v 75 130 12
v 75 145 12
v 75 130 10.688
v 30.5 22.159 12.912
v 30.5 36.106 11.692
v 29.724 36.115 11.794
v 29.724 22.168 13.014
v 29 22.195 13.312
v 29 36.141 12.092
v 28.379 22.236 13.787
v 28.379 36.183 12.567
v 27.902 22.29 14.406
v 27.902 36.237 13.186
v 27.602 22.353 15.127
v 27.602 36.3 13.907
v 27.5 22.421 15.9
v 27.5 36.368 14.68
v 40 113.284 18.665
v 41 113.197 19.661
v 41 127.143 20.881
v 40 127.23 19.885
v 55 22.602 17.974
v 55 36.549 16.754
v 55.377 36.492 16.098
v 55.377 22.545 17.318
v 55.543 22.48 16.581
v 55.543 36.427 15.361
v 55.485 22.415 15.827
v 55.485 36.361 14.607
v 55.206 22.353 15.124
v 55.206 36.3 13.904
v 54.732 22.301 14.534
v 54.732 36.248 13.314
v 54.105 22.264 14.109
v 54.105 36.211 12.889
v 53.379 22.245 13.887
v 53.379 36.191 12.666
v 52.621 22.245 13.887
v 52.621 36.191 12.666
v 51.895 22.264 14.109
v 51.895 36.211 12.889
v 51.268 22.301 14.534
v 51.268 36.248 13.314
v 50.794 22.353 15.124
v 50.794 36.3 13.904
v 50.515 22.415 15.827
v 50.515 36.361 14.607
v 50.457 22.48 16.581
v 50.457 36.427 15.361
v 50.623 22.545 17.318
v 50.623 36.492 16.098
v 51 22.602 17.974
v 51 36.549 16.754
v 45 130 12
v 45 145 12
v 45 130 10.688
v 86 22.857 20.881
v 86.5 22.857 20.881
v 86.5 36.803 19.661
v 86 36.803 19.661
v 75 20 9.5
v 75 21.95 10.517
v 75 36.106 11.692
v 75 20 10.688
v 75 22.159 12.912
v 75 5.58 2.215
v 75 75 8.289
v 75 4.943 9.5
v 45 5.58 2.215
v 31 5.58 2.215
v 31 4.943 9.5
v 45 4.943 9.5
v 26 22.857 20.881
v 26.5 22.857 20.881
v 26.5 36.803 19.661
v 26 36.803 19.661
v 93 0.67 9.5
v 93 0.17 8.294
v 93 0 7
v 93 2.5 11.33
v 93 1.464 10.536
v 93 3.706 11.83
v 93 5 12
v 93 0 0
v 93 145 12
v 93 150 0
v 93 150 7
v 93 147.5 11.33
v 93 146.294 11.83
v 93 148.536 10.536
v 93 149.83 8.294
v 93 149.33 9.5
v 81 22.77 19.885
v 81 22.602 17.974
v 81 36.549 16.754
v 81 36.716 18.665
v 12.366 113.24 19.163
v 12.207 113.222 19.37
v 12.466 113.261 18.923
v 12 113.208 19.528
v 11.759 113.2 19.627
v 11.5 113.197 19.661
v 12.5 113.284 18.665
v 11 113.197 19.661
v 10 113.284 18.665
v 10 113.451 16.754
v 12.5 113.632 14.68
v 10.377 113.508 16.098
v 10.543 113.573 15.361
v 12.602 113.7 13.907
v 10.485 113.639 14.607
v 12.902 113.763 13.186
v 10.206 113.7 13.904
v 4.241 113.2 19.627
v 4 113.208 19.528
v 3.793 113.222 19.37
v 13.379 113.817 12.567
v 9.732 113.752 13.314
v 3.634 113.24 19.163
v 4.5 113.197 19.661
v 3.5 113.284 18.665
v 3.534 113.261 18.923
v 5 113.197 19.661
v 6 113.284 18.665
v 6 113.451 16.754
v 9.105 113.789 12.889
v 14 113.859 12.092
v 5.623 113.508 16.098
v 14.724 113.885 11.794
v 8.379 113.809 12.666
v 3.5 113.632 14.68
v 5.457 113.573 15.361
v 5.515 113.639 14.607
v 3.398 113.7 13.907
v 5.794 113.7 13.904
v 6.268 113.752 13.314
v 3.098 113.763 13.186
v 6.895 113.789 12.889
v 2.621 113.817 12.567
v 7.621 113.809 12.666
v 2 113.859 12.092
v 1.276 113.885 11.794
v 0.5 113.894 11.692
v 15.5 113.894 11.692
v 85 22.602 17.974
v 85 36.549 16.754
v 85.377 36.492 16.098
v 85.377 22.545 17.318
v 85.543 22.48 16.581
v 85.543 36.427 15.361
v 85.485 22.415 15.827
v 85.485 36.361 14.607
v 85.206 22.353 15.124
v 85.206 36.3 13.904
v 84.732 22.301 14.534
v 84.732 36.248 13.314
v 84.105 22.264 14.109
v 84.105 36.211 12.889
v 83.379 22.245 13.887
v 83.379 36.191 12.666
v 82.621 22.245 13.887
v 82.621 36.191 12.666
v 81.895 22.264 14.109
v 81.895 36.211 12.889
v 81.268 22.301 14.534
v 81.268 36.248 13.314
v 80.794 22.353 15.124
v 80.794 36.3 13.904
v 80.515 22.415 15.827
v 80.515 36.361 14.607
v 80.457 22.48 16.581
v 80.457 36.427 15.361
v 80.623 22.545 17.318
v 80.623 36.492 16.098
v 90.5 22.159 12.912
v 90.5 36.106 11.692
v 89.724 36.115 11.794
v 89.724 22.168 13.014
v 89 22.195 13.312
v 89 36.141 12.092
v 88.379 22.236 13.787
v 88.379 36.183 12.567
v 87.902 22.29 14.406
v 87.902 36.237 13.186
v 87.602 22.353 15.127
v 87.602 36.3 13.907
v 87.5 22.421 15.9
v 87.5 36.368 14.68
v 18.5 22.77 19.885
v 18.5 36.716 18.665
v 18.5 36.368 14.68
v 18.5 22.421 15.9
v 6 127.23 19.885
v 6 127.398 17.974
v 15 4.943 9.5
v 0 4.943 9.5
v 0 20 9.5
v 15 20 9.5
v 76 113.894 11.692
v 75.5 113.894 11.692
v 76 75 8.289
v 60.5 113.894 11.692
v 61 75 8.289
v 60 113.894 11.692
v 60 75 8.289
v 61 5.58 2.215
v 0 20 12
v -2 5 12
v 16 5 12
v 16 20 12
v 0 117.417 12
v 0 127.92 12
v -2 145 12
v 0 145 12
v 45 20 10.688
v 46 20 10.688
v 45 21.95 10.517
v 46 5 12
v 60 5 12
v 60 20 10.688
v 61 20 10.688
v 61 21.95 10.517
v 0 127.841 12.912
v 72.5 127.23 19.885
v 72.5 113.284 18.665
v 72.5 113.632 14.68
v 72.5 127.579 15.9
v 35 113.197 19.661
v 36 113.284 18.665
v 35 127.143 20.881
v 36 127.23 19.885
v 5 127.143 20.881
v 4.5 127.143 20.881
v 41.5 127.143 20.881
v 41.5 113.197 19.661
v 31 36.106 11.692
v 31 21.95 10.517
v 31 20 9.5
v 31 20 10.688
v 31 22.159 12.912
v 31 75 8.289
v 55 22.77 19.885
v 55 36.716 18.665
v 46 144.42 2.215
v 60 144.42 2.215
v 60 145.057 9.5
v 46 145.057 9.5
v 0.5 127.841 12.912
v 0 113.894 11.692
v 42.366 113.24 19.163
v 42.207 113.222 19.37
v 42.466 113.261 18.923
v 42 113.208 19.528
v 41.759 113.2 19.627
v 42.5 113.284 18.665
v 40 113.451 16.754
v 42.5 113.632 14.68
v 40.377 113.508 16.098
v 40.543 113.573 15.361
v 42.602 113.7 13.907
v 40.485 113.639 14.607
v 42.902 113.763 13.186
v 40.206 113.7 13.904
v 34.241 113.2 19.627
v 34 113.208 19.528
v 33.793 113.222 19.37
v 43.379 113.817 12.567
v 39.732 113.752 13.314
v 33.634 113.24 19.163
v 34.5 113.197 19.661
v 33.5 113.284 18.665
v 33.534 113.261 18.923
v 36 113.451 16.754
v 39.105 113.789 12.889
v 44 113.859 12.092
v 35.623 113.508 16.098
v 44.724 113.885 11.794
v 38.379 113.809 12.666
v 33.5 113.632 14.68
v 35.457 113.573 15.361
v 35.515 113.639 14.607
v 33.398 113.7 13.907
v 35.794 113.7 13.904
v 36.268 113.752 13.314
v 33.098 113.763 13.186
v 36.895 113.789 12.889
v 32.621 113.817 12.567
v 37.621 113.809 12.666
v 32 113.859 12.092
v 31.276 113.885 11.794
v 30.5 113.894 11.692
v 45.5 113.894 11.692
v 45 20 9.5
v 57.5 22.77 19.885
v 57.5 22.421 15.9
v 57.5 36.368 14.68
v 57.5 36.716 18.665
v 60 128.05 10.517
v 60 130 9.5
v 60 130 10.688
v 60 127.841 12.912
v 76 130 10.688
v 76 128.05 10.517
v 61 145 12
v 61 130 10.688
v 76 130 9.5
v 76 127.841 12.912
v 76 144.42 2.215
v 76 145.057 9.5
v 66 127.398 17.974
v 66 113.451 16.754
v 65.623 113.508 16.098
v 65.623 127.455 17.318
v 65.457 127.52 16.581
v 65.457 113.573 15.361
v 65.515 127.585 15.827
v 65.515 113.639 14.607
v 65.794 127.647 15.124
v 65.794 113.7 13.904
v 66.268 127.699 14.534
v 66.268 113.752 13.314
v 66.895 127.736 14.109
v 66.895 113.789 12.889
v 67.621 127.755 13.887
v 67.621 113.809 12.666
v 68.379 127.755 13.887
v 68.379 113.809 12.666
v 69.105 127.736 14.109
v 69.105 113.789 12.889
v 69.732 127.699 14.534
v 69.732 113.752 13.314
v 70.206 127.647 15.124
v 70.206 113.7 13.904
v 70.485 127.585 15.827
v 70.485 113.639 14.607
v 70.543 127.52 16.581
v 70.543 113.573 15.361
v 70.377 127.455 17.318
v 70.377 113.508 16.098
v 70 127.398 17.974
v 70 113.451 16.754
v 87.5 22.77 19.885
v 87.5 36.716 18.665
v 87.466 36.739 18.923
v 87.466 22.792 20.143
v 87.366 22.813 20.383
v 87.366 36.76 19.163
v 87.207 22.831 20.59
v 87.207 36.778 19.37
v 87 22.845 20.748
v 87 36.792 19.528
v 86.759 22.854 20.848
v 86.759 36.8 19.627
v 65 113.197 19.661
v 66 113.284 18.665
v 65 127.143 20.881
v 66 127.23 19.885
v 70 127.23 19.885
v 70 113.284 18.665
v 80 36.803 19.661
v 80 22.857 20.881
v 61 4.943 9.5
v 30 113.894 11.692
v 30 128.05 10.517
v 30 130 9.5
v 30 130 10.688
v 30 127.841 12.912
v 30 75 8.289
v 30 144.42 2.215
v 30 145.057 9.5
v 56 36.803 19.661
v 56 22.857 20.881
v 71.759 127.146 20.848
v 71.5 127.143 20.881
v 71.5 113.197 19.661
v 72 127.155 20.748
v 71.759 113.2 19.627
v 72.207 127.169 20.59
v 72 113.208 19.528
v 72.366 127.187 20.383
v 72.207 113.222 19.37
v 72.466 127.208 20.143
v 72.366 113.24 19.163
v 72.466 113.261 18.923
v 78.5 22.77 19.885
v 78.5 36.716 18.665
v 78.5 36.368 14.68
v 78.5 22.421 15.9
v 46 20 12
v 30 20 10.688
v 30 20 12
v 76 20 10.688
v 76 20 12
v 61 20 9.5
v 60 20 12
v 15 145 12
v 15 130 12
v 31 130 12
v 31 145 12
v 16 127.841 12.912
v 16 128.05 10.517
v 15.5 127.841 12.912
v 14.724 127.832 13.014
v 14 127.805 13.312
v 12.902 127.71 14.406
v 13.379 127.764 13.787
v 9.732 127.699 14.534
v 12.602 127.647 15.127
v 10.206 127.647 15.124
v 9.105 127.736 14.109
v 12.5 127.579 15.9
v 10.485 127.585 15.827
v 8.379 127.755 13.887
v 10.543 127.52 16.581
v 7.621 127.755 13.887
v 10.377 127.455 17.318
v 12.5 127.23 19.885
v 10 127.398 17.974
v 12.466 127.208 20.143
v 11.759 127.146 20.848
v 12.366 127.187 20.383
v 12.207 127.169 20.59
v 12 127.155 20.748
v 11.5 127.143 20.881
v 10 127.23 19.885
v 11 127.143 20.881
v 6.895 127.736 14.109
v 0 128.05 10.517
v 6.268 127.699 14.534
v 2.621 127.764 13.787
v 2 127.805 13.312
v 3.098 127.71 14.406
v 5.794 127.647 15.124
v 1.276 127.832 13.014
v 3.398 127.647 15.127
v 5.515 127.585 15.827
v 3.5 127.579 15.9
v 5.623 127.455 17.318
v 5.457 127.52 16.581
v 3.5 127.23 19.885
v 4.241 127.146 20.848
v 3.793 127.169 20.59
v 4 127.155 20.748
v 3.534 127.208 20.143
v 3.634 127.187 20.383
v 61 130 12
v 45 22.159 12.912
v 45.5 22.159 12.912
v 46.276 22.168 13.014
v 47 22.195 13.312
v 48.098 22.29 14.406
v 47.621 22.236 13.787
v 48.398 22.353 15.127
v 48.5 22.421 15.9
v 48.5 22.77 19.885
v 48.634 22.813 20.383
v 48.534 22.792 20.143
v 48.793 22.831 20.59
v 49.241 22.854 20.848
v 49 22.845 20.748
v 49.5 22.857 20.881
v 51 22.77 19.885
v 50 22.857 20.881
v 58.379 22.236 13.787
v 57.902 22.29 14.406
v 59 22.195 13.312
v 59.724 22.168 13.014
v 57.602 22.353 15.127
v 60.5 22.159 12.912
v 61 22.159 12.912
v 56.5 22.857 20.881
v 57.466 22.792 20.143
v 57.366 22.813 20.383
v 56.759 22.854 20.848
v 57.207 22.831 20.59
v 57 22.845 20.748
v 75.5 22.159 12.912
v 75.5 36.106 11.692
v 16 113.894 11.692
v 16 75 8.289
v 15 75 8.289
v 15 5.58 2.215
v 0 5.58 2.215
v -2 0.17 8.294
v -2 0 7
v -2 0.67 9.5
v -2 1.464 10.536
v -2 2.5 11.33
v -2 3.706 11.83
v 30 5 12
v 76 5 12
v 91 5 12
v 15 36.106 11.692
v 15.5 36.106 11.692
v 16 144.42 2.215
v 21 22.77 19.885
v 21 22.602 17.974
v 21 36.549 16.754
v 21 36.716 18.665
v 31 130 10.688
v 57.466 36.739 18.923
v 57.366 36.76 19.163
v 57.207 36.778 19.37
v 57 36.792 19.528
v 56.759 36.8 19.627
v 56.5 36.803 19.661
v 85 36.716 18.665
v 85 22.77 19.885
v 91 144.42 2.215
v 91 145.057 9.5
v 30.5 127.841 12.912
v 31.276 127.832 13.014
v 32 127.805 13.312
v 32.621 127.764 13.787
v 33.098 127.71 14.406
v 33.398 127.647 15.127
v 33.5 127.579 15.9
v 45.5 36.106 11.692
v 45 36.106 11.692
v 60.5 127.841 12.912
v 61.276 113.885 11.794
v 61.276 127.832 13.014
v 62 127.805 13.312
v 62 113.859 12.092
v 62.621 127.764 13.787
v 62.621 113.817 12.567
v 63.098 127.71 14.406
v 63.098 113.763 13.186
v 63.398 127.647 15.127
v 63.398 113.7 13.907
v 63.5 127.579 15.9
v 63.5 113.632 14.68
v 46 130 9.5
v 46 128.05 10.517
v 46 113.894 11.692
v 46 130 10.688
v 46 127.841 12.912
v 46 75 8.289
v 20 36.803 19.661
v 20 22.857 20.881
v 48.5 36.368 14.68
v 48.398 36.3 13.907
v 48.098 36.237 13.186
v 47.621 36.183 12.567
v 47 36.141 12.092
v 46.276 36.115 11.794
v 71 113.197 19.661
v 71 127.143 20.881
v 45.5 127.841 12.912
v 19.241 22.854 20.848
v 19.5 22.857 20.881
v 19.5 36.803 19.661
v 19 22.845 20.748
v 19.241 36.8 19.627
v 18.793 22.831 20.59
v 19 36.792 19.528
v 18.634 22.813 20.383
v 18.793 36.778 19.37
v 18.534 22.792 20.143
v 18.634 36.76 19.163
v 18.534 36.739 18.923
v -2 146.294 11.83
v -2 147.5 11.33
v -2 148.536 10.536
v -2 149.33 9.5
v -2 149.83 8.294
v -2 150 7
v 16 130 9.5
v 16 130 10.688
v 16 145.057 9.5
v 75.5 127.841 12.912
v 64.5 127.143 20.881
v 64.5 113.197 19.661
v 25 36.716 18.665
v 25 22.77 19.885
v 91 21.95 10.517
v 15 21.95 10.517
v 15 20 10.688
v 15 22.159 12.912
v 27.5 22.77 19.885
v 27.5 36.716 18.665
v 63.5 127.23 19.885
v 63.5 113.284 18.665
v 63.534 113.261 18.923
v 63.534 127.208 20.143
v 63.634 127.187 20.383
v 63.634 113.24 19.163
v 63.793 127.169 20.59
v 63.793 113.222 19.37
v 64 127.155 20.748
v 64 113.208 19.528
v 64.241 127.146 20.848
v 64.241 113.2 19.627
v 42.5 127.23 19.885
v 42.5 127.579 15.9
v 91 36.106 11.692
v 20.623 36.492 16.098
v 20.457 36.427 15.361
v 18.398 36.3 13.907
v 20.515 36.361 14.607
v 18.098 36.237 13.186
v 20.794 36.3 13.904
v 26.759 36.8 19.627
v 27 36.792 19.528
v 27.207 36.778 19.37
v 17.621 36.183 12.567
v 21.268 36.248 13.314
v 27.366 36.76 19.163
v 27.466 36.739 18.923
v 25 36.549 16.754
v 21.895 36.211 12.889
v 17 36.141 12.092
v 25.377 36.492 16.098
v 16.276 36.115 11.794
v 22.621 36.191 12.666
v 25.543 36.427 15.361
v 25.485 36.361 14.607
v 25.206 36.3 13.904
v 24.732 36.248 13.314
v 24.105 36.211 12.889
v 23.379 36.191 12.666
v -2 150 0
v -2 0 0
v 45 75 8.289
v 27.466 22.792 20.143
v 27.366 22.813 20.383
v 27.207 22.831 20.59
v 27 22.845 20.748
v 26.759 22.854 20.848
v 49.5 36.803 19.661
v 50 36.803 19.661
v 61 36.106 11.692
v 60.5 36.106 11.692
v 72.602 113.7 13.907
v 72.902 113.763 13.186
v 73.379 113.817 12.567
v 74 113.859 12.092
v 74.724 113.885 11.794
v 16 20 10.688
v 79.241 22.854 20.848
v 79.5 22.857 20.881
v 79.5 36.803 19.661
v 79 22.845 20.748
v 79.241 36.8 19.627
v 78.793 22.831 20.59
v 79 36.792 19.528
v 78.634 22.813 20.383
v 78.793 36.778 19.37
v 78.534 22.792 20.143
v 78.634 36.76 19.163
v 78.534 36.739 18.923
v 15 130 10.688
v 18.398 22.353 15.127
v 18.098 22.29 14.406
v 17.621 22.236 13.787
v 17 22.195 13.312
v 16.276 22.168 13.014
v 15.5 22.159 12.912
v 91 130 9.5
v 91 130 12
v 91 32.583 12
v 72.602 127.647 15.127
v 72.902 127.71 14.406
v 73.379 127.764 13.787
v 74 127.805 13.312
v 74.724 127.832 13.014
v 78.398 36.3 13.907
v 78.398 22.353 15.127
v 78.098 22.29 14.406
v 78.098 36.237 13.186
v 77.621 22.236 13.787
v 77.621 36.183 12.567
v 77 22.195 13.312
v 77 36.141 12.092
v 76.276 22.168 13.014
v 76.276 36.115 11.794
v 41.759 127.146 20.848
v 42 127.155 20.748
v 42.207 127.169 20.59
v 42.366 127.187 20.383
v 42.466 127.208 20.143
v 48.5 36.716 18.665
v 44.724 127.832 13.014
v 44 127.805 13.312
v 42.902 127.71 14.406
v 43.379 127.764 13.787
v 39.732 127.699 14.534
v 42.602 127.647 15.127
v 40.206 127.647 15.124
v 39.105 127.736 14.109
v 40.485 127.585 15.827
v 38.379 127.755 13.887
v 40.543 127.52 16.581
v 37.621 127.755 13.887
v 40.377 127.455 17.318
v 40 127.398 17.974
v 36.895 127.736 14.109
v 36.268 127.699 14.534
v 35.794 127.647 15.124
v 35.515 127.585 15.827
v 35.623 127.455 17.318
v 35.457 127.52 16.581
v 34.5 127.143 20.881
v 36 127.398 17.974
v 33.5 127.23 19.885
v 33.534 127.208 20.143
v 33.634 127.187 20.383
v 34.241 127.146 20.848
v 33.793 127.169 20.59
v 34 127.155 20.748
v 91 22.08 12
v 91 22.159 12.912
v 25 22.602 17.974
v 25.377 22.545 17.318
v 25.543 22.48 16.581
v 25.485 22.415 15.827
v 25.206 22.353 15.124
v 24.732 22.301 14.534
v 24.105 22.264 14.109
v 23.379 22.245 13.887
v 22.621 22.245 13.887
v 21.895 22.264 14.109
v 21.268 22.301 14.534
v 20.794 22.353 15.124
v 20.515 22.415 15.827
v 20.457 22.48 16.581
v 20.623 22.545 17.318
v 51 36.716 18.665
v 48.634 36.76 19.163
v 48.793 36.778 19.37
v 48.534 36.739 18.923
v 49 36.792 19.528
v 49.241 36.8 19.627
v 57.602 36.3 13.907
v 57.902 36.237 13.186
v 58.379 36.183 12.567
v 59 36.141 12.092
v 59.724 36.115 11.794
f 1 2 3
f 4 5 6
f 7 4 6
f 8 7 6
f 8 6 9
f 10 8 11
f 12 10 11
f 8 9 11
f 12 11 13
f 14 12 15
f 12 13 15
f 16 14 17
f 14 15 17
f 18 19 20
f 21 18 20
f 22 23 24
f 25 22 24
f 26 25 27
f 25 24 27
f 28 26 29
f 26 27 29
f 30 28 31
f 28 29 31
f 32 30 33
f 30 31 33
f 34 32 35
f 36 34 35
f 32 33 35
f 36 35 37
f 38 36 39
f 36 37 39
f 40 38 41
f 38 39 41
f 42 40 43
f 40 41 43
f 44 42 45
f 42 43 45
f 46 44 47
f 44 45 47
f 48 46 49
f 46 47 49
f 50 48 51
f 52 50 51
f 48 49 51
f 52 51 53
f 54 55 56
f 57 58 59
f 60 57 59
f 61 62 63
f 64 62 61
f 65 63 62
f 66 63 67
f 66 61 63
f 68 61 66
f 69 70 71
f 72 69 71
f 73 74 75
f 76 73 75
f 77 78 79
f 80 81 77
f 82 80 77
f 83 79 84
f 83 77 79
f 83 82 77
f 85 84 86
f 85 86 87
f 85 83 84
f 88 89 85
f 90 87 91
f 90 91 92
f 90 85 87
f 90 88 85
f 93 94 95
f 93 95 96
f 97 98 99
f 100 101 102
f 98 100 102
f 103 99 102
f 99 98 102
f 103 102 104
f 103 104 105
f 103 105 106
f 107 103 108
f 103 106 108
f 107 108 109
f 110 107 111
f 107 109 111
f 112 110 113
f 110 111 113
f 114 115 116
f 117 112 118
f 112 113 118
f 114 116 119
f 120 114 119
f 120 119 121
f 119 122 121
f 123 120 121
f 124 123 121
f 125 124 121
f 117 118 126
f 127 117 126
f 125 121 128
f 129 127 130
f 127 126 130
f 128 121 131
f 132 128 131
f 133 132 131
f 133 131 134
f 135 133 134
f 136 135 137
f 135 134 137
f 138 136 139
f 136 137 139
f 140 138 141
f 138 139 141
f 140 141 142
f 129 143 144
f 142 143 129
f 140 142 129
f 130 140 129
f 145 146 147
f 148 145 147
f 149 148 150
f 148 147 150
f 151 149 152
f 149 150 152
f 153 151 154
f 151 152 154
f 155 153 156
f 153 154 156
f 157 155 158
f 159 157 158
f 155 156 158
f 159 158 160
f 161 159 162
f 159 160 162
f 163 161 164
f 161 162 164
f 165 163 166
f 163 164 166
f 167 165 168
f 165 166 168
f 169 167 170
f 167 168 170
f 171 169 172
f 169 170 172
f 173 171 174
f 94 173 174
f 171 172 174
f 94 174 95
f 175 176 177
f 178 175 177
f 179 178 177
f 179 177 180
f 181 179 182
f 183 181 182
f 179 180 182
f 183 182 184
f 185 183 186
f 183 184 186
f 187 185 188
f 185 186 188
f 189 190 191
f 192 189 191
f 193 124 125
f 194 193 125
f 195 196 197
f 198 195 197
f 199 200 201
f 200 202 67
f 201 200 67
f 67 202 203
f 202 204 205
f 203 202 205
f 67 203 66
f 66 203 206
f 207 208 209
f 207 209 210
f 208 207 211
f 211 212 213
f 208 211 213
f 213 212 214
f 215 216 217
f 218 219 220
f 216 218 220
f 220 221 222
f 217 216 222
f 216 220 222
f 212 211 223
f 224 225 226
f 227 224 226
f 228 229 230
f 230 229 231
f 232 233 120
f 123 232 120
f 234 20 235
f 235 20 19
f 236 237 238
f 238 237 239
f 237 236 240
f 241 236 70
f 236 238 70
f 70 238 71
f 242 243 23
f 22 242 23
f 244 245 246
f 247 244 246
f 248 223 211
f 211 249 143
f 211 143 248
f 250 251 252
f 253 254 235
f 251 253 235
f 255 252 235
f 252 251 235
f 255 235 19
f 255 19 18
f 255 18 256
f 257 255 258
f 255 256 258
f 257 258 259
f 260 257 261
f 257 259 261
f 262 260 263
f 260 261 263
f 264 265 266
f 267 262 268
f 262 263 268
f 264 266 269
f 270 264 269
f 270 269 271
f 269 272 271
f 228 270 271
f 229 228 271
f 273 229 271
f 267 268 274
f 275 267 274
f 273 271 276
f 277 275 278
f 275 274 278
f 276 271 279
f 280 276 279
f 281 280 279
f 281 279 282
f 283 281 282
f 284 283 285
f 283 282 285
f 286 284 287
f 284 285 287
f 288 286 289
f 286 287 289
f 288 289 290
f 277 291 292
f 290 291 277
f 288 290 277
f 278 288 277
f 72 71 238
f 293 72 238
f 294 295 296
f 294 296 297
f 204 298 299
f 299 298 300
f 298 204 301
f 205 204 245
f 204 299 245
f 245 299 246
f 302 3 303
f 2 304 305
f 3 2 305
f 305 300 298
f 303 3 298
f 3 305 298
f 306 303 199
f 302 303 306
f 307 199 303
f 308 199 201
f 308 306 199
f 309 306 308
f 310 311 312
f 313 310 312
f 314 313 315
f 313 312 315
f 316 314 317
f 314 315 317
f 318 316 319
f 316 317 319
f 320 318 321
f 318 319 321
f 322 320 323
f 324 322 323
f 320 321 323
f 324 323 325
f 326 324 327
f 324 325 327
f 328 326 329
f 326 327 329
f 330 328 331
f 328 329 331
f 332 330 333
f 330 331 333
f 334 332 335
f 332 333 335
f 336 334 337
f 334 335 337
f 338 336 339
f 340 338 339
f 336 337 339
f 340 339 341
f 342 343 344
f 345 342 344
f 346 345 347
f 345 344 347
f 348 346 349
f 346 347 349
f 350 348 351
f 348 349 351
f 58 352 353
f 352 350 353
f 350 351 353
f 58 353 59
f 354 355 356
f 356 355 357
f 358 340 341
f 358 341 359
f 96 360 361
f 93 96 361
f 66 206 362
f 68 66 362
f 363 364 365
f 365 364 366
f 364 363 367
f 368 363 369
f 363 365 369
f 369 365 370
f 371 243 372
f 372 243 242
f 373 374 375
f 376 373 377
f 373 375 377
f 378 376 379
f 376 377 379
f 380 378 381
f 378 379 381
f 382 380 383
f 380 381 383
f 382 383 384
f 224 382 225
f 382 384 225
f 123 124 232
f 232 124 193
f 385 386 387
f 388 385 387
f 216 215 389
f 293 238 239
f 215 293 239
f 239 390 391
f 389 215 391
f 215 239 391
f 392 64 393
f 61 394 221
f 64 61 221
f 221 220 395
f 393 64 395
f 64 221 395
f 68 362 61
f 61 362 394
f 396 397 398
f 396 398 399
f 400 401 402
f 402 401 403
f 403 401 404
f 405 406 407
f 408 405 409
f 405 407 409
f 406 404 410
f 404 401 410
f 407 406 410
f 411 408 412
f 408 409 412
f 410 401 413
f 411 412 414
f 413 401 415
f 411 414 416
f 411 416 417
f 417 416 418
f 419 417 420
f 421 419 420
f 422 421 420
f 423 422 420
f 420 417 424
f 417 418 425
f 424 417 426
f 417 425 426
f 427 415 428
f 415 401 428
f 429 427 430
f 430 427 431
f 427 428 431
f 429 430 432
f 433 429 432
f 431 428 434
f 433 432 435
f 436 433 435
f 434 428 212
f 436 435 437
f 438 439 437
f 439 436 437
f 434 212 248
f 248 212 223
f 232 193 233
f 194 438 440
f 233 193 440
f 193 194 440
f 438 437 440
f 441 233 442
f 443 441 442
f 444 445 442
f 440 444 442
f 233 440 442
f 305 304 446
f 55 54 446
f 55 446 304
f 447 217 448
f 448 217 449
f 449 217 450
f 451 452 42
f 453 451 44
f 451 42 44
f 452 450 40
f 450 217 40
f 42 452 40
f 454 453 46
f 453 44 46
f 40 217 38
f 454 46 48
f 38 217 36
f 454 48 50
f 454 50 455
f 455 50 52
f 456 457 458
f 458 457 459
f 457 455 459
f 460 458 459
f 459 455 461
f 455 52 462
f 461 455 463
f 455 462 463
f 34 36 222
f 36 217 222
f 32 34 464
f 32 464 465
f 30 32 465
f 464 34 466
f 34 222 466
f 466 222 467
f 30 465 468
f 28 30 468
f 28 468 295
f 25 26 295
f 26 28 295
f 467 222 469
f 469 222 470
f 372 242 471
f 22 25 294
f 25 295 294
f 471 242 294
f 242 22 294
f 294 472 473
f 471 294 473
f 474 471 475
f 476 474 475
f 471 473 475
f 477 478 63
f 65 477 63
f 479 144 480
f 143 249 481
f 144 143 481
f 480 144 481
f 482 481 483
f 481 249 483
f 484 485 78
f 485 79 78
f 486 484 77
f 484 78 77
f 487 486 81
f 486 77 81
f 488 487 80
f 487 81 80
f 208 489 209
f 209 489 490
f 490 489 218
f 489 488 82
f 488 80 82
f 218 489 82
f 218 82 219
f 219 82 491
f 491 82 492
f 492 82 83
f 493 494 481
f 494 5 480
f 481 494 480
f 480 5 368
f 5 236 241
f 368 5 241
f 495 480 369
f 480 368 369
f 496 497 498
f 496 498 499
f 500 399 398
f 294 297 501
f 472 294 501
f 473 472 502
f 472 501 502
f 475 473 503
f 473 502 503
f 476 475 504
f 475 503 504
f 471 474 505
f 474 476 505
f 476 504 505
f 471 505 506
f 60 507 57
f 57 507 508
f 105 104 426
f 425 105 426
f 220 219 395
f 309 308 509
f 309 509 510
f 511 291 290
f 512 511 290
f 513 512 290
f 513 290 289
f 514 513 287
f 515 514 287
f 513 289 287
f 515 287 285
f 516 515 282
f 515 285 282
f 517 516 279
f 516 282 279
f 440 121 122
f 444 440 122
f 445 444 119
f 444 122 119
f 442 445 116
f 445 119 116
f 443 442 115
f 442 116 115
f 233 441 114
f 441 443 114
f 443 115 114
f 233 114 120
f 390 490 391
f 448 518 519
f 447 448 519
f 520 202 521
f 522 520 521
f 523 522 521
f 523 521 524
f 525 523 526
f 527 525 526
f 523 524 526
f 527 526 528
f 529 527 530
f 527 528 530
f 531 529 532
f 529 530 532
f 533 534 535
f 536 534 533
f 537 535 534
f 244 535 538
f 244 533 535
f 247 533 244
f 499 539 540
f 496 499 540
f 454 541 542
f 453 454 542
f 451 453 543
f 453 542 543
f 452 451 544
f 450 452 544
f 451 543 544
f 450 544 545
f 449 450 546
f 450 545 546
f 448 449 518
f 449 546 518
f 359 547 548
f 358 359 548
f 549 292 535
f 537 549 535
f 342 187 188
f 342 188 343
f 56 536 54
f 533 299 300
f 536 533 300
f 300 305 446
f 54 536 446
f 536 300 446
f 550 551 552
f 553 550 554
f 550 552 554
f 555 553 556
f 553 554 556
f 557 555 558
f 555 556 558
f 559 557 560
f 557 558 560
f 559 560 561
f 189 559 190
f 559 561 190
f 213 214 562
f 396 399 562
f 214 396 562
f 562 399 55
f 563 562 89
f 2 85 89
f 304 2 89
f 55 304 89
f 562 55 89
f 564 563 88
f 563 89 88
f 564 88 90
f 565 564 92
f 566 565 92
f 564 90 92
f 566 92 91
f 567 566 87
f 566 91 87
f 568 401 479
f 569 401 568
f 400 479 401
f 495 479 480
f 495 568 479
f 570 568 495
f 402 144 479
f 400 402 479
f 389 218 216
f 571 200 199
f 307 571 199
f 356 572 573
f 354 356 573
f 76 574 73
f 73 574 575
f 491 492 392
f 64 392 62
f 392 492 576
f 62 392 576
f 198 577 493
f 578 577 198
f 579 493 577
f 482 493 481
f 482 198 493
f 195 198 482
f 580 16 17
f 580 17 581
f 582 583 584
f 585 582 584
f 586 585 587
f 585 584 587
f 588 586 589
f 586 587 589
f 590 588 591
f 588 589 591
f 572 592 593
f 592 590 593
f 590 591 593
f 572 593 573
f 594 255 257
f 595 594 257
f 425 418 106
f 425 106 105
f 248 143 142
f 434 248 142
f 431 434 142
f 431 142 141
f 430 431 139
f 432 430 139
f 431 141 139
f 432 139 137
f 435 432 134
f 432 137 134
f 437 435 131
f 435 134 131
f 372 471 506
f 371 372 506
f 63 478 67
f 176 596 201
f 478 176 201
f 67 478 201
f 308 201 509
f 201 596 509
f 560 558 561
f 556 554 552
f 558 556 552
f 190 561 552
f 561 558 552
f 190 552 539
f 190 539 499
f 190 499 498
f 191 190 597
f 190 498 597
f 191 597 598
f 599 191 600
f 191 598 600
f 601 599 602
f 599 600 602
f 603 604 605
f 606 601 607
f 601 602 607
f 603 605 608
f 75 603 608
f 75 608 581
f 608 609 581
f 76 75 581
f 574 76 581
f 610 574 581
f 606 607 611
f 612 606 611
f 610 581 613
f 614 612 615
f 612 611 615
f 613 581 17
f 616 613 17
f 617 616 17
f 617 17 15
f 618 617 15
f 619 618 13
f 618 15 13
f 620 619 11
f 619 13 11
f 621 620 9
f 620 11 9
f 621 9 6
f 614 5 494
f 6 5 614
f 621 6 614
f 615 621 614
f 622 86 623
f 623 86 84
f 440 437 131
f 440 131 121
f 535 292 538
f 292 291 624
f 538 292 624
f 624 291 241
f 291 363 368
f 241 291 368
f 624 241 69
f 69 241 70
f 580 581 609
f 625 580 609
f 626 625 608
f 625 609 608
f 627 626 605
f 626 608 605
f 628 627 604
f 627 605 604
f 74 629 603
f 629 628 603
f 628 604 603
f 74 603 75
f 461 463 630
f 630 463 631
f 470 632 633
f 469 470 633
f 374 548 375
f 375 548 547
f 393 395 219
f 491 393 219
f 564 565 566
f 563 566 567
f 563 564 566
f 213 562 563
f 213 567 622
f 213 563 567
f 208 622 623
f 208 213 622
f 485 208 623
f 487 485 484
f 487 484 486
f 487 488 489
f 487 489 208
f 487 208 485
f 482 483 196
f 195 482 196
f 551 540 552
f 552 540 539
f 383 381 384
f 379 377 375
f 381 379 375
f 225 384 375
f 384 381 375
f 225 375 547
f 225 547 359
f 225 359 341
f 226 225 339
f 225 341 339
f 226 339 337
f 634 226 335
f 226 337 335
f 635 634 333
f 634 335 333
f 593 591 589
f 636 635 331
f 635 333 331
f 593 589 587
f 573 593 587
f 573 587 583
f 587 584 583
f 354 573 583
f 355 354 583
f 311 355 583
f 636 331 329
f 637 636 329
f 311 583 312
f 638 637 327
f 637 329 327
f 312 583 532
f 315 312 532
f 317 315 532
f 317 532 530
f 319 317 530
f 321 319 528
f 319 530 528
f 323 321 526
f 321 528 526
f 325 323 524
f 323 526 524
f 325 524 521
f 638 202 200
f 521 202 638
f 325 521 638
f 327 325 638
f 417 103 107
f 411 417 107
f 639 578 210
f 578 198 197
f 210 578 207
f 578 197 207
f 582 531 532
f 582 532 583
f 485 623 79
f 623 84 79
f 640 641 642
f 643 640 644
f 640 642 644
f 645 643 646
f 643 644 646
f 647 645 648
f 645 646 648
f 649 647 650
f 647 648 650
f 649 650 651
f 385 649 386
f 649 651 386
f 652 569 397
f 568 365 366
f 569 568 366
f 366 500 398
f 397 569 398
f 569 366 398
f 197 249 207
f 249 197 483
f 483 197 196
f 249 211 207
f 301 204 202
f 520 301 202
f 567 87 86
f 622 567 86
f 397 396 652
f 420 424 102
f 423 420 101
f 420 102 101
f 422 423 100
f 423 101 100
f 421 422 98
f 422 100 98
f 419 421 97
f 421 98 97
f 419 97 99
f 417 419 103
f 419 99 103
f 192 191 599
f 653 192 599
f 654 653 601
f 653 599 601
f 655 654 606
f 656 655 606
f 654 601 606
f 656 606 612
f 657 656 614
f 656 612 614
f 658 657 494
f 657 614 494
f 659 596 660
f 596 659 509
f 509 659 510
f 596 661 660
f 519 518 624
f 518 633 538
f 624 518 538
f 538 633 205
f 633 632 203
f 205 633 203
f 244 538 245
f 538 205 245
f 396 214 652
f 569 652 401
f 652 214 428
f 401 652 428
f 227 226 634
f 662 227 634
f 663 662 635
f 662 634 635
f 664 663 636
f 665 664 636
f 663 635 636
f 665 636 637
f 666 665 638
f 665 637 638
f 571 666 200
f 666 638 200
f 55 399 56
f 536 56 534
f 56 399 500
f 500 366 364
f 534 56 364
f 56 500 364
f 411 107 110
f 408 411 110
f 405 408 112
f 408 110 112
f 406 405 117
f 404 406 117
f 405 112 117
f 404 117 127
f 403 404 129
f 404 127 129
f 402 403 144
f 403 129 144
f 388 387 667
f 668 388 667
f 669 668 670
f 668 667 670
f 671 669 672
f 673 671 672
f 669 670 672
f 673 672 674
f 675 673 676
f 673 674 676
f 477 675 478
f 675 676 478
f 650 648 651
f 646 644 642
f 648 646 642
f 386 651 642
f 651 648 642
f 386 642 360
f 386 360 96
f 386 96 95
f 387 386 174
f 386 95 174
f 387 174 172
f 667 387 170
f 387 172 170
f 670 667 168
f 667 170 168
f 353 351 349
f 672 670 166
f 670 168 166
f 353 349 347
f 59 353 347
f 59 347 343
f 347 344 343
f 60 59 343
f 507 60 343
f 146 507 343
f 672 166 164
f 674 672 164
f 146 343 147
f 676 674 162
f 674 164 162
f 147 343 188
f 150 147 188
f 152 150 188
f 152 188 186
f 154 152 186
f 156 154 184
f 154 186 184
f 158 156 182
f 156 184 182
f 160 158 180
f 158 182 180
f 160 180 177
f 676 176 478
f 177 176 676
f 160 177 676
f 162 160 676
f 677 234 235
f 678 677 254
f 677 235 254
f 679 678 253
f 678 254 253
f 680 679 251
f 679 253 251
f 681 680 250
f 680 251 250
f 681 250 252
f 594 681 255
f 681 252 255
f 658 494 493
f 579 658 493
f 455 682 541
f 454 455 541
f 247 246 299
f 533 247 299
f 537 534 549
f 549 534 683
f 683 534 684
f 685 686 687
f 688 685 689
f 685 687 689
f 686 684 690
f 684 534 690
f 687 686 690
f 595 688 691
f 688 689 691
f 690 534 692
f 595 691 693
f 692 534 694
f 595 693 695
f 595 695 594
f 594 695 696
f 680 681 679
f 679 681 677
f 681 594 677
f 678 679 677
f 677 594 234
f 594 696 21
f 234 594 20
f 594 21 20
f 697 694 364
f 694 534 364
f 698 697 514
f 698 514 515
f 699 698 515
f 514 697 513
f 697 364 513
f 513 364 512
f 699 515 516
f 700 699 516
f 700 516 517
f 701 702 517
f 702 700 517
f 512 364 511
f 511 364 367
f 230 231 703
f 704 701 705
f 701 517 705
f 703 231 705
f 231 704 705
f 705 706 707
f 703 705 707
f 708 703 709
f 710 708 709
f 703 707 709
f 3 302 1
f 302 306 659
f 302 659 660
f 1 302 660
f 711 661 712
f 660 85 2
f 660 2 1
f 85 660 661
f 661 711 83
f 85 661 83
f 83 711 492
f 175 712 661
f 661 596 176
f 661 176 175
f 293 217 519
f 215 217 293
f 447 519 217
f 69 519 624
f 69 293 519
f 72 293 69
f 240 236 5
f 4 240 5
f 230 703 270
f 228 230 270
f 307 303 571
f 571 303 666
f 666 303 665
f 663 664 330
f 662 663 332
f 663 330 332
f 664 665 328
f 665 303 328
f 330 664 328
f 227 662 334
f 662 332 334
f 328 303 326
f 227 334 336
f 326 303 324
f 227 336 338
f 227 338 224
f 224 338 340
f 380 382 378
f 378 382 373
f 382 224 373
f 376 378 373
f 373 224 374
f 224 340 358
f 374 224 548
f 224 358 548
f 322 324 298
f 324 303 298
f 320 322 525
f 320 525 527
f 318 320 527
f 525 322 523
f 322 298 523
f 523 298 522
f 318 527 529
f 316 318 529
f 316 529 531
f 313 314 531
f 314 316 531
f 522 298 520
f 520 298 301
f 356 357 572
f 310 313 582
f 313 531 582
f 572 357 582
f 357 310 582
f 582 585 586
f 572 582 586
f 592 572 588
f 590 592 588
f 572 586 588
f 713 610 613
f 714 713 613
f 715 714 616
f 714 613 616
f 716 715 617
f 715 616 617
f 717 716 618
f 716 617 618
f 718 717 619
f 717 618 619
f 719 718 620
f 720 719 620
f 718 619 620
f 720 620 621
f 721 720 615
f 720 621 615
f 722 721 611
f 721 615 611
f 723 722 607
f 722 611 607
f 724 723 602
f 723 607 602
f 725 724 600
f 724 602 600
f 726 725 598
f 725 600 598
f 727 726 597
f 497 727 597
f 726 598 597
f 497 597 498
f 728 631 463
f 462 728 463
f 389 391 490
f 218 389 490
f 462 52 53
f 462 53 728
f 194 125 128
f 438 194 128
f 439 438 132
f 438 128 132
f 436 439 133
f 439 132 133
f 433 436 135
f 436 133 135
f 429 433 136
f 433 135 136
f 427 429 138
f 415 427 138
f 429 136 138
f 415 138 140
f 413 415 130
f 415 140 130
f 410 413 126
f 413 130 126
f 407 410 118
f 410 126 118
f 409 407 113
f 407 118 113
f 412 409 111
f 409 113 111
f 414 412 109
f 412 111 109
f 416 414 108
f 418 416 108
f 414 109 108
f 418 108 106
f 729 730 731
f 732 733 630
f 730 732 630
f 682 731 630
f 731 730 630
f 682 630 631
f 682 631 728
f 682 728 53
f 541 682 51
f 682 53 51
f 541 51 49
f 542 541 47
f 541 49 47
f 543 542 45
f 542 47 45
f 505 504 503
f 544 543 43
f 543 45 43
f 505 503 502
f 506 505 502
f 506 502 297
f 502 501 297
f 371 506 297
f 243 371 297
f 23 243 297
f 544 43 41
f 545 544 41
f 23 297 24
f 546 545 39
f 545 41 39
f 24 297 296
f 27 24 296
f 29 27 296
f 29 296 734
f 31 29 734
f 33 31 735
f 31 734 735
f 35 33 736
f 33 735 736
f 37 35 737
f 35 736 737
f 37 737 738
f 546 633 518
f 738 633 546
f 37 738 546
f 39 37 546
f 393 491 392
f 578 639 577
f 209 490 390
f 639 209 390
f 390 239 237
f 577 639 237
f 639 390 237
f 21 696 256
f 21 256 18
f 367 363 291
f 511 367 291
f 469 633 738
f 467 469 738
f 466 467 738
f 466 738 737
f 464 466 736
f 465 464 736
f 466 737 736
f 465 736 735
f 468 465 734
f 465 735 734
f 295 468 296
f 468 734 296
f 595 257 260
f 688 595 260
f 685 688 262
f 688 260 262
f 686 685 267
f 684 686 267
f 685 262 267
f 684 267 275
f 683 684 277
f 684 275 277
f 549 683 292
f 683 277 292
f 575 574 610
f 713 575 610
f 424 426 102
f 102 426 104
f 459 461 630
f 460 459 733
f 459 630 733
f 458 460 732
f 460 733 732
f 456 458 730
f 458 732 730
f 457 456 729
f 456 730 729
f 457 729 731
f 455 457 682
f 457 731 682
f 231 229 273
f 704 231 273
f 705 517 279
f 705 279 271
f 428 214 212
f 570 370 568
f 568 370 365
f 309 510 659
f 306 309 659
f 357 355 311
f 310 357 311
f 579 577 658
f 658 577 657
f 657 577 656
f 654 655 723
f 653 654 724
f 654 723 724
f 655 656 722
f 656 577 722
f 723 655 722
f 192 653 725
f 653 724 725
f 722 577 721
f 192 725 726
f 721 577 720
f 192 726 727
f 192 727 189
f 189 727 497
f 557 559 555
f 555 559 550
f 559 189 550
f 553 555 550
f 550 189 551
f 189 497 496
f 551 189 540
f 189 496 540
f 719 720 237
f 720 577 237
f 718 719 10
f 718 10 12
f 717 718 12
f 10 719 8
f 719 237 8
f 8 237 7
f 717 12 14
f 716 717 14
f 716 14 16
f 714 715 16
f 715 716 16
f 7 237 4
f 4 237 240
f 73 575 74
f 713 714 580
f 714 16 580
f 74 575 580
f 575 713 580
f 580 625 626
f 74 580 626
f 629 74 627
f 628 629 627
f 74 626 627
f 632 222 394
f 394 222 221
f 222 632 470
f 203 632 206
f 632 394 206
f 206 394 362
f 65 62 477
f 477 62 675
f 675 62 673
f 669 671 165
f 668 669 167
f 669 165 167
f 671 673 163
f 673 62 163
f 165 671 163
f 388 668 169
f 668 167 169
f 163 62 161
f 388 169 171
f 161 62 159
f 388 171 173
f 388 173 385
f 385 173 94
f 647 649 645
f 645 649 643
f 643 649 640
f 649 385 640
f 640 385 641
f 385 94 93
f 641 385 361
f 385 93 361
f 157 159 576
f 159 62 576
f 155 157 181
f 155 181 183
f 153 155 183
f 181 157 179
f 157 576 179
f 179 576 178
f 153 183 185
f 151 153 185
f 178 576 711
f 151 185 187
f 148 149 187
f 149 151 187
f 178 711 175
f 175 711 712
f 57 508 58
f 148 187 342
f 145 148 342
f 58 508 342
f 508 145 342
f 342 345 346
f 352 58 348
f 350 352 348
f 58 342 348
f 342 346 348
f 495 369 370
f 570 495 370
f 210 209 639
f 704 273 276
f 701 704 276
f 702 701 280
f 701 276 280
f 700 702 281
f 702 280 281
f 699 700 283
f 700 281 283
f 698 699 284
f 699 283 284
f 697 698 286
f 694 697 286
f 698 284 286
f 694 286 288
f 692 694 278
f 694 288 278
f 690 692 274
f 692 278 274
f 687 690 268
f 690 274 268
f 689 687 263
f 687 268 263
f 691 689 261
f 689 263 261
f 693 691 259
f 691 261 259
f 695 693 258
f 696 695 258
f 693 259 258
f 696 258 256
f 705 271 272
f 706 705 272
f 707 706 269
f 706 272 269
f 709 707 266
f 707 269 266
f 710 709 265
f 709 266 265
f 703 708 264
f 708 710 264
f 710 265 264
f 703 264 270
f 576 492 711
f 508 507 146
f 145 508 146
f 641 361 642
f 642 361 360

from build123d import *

# Parameters (mm, degrees)
F1_DEPTH  = 16
F3_DEPTH  = 25
F4_SIZE   = 1
F11_ANGLE = 180
F14_DEPTH = 2
F16_DEPTH = 2


with BuildPart() as f1:
    # F0 (on Right) → F1 (new body)
    with BuildSketch(Plane.YZ):
        with BuildLine():
            Line((0, 7), (0, 0))
            Line((0, 0), (150, 0))
            Line((150, 0), (150, 7))
            ThreePointArc((150, 7), (148.5355339059, 10.5355339059), (145, 12))
            Line((145, 12), (128.050036002, 10.517070303))
            Line((128.050036002, 10.517070303), (127.1432693018, 20.8814611121))
            Line((127.1432693018, 20.8814611121), (113.1965435286, 19.6612807136))
            Line((113.1965435286, 19.6612807136), (113.8937894705, 11.6917231289))
            Line((113.8937894705, 11.6917231289), (5.5800139851, 2.2154956702))
            Line((5.5800139851, 2.2154956702), (4.9427024368, 9.5))
            Line((4.9427024368, 9.5), (20, 9.5))
            Line((20, 9.5), (20, 12))
            Line((20, 12), (5, 12))
            ThreePointArc((5, 12), (1.4644660941, 10.5355339059), (0, 7))
        make_face()
    extrude(amount=F1_DEPTH)

    # F2 (on face) → F3 (cut)
    with BuildSketch(Plane(origin=(0, 114.0437613881, 9.9775362673), x_dir=(1, 0, 0), z_dir=(0, -0.9961946981, -0.0871557427))):
        with BuildLine():
            Line((6, 9.7207347769), (6, 6.8026639789))
            ThreePointArc((6, 6.8026639789), (8, 2.6707347769), (10, 6.8026639789))
            Line((10, 6.8026639789), (10, 9.7207347769))
            Line((10, 9.7207347769), (11.5, 9.7207347769))
            ThreePointArc((11.5, 9.7207347769), (12.2071067812, 9.4278415581), (12.5, 8.7207347769))
            Line((12.5, 8.7207347769), (12.5, 4.7207347769))
            ThreePointArc((12.5, 4.7207347769), (13.3786796564, 2.5994144334), (15.5, 1.7207347769))
            Line((15.5, 1.7207347769), (18.5, 1.7207347769))
            Line((18.5, 1.7207347769), (18.5, 10.7207347769))
            Line((18.5, 10.7207347769), (-2.5, 10.7207347769))
            Line((-2.5, 10.7207347769), (-2.5, 1.7207347769))
            Line((-2.5, 1.7207347769), (0.5, 1.7207347769))
            ThreePointArc((0.5, 1.7207347769), (2.6213203436, 2.5994144334), (3.5, 4.7207347769))
            Line((3.5, 4.7207347769), (3.5, 8.7207347769))
            ThreePointArc((3.5, 8.7207347769), (3.7928932188, 9.4278415581), (4.5, 9.7207347769))
            Line((4.5, 9.7207347769), (6, 9.7207347769))
        make_face()
    extrude(amount=-F3_DEPTH, mode=Mode.SUBTRACT)

    # F4
    f4_edges = [f1.edges().sort_by_distance(p)[0] for p in [
        (6, 120.169906, 20.271371),
        (10, 120.169906, 20.271371),
    ]]
    chamfer(f4_edges, length=F4_SIZE)


with BuildPart() as f5_1:
    # F5: copy of F1
    add(f1.part.moved(Location((30, 0, 0))))


with BuildPart() as f6_1:
    # F6: copy of F5_1
    add(f5_1.part.moved(Location((30, 0, 0))))


with BuildPart() as f7_1:
    # F7: copy of F1
    add(f1.part.moved(Location((0, 160, 0))))


with BuildPart() as f8_1:
    # F8: copy of F5_1
    add(f5_1.part.moved(Location((0, 160, 0))))


with BuildPart() as f9_1:
    # F9: copy of F6_1
    add(f6_1.part.moved(Location((0, 160, 0))))


with BuildPart() as f8_1_1:
    # F11: moved
    add(f8_1.part.rotate(Axis((0, 0, 25), (0, 0, 1)), F11_ANGLE))


with BuildPart() as f9_1_1:
    # F11: moved
    add(f9_1.part.rotate(Axis((0, 0, 25), (0, 0, 1)), F11_ANGLE))


with BuildPart() as f7_1_1:
    # F11: moved
    add(f7_1.part.rotate(Axis((0, 0, 25), (0, 0, 1)), F11_ANGLE))


with BuildPart() as f7_1_2:
    # F12: moved
    add(f7_1_1.part.moved(Location((91, 310, 0))))

    # F13 (on face) → F14 (join)
    with BuildSketch(Plane.YZ.offset(91)):
        with BuildLine():
            Line((0, 7), (0, 0))
            Line((0, 0), (150, 0))
            Line((150, 0), (150, 7))
            ThreePointArc((150, 7), (148.5355339059, 10.5355339059), (145, 12))
            Line((145, 12), (5, 12))
            ThreePointArc((5, 12), (1.4644660941, 10.5355339059), (0, 7))
        make_face()
    extrude(amount=F14_DEPTH)


with BuildPart() as f8_1_2:
    # F12: moved
    add(f8_1_1.part.moved(Location((91, 310, 0))))


with BuildPart() as f9_1_2:
    # F12: moved
    add(f9_1_1.part.moved(Location((91, 310, 0))))


with BuildPart() as f1_1:
    add(f1.part)

    add(f5_1.part)  # F16 merges F5_1

    add(f6_1.part)  # F16 merges F6_1

    add(f7_1_2.part)  # F16 merges F7_1

    add(f8_1_2.part)  # F16 merges F8_1

    add(f9_1_2.part)  # F16 merges F9_1
    # F15 (on face) → F16 (join)
    with BuildSketch(Plane(origin=(0, 0, 0), x_dir=(0, -1, 0), z_dir=(-1, 0, 0))):
        with BuildLine():
            Line((-150, 0), (0, 0))
            Line((0, 0), (0, 7))
            ThreePointArc((0, 7), (-1.4644660941, 10.5355339059), (-5, 12))
            Line((-5, 12), (-145, 12))
            ThreePointArc((-145, 12), (-148.5355339059, 10.5355339059), (-150, 7))
            Line((-150, 7), (-150, 0))
        make_face()
    extrude(amount=F16_DEPTH)


solid = f1_1.part
